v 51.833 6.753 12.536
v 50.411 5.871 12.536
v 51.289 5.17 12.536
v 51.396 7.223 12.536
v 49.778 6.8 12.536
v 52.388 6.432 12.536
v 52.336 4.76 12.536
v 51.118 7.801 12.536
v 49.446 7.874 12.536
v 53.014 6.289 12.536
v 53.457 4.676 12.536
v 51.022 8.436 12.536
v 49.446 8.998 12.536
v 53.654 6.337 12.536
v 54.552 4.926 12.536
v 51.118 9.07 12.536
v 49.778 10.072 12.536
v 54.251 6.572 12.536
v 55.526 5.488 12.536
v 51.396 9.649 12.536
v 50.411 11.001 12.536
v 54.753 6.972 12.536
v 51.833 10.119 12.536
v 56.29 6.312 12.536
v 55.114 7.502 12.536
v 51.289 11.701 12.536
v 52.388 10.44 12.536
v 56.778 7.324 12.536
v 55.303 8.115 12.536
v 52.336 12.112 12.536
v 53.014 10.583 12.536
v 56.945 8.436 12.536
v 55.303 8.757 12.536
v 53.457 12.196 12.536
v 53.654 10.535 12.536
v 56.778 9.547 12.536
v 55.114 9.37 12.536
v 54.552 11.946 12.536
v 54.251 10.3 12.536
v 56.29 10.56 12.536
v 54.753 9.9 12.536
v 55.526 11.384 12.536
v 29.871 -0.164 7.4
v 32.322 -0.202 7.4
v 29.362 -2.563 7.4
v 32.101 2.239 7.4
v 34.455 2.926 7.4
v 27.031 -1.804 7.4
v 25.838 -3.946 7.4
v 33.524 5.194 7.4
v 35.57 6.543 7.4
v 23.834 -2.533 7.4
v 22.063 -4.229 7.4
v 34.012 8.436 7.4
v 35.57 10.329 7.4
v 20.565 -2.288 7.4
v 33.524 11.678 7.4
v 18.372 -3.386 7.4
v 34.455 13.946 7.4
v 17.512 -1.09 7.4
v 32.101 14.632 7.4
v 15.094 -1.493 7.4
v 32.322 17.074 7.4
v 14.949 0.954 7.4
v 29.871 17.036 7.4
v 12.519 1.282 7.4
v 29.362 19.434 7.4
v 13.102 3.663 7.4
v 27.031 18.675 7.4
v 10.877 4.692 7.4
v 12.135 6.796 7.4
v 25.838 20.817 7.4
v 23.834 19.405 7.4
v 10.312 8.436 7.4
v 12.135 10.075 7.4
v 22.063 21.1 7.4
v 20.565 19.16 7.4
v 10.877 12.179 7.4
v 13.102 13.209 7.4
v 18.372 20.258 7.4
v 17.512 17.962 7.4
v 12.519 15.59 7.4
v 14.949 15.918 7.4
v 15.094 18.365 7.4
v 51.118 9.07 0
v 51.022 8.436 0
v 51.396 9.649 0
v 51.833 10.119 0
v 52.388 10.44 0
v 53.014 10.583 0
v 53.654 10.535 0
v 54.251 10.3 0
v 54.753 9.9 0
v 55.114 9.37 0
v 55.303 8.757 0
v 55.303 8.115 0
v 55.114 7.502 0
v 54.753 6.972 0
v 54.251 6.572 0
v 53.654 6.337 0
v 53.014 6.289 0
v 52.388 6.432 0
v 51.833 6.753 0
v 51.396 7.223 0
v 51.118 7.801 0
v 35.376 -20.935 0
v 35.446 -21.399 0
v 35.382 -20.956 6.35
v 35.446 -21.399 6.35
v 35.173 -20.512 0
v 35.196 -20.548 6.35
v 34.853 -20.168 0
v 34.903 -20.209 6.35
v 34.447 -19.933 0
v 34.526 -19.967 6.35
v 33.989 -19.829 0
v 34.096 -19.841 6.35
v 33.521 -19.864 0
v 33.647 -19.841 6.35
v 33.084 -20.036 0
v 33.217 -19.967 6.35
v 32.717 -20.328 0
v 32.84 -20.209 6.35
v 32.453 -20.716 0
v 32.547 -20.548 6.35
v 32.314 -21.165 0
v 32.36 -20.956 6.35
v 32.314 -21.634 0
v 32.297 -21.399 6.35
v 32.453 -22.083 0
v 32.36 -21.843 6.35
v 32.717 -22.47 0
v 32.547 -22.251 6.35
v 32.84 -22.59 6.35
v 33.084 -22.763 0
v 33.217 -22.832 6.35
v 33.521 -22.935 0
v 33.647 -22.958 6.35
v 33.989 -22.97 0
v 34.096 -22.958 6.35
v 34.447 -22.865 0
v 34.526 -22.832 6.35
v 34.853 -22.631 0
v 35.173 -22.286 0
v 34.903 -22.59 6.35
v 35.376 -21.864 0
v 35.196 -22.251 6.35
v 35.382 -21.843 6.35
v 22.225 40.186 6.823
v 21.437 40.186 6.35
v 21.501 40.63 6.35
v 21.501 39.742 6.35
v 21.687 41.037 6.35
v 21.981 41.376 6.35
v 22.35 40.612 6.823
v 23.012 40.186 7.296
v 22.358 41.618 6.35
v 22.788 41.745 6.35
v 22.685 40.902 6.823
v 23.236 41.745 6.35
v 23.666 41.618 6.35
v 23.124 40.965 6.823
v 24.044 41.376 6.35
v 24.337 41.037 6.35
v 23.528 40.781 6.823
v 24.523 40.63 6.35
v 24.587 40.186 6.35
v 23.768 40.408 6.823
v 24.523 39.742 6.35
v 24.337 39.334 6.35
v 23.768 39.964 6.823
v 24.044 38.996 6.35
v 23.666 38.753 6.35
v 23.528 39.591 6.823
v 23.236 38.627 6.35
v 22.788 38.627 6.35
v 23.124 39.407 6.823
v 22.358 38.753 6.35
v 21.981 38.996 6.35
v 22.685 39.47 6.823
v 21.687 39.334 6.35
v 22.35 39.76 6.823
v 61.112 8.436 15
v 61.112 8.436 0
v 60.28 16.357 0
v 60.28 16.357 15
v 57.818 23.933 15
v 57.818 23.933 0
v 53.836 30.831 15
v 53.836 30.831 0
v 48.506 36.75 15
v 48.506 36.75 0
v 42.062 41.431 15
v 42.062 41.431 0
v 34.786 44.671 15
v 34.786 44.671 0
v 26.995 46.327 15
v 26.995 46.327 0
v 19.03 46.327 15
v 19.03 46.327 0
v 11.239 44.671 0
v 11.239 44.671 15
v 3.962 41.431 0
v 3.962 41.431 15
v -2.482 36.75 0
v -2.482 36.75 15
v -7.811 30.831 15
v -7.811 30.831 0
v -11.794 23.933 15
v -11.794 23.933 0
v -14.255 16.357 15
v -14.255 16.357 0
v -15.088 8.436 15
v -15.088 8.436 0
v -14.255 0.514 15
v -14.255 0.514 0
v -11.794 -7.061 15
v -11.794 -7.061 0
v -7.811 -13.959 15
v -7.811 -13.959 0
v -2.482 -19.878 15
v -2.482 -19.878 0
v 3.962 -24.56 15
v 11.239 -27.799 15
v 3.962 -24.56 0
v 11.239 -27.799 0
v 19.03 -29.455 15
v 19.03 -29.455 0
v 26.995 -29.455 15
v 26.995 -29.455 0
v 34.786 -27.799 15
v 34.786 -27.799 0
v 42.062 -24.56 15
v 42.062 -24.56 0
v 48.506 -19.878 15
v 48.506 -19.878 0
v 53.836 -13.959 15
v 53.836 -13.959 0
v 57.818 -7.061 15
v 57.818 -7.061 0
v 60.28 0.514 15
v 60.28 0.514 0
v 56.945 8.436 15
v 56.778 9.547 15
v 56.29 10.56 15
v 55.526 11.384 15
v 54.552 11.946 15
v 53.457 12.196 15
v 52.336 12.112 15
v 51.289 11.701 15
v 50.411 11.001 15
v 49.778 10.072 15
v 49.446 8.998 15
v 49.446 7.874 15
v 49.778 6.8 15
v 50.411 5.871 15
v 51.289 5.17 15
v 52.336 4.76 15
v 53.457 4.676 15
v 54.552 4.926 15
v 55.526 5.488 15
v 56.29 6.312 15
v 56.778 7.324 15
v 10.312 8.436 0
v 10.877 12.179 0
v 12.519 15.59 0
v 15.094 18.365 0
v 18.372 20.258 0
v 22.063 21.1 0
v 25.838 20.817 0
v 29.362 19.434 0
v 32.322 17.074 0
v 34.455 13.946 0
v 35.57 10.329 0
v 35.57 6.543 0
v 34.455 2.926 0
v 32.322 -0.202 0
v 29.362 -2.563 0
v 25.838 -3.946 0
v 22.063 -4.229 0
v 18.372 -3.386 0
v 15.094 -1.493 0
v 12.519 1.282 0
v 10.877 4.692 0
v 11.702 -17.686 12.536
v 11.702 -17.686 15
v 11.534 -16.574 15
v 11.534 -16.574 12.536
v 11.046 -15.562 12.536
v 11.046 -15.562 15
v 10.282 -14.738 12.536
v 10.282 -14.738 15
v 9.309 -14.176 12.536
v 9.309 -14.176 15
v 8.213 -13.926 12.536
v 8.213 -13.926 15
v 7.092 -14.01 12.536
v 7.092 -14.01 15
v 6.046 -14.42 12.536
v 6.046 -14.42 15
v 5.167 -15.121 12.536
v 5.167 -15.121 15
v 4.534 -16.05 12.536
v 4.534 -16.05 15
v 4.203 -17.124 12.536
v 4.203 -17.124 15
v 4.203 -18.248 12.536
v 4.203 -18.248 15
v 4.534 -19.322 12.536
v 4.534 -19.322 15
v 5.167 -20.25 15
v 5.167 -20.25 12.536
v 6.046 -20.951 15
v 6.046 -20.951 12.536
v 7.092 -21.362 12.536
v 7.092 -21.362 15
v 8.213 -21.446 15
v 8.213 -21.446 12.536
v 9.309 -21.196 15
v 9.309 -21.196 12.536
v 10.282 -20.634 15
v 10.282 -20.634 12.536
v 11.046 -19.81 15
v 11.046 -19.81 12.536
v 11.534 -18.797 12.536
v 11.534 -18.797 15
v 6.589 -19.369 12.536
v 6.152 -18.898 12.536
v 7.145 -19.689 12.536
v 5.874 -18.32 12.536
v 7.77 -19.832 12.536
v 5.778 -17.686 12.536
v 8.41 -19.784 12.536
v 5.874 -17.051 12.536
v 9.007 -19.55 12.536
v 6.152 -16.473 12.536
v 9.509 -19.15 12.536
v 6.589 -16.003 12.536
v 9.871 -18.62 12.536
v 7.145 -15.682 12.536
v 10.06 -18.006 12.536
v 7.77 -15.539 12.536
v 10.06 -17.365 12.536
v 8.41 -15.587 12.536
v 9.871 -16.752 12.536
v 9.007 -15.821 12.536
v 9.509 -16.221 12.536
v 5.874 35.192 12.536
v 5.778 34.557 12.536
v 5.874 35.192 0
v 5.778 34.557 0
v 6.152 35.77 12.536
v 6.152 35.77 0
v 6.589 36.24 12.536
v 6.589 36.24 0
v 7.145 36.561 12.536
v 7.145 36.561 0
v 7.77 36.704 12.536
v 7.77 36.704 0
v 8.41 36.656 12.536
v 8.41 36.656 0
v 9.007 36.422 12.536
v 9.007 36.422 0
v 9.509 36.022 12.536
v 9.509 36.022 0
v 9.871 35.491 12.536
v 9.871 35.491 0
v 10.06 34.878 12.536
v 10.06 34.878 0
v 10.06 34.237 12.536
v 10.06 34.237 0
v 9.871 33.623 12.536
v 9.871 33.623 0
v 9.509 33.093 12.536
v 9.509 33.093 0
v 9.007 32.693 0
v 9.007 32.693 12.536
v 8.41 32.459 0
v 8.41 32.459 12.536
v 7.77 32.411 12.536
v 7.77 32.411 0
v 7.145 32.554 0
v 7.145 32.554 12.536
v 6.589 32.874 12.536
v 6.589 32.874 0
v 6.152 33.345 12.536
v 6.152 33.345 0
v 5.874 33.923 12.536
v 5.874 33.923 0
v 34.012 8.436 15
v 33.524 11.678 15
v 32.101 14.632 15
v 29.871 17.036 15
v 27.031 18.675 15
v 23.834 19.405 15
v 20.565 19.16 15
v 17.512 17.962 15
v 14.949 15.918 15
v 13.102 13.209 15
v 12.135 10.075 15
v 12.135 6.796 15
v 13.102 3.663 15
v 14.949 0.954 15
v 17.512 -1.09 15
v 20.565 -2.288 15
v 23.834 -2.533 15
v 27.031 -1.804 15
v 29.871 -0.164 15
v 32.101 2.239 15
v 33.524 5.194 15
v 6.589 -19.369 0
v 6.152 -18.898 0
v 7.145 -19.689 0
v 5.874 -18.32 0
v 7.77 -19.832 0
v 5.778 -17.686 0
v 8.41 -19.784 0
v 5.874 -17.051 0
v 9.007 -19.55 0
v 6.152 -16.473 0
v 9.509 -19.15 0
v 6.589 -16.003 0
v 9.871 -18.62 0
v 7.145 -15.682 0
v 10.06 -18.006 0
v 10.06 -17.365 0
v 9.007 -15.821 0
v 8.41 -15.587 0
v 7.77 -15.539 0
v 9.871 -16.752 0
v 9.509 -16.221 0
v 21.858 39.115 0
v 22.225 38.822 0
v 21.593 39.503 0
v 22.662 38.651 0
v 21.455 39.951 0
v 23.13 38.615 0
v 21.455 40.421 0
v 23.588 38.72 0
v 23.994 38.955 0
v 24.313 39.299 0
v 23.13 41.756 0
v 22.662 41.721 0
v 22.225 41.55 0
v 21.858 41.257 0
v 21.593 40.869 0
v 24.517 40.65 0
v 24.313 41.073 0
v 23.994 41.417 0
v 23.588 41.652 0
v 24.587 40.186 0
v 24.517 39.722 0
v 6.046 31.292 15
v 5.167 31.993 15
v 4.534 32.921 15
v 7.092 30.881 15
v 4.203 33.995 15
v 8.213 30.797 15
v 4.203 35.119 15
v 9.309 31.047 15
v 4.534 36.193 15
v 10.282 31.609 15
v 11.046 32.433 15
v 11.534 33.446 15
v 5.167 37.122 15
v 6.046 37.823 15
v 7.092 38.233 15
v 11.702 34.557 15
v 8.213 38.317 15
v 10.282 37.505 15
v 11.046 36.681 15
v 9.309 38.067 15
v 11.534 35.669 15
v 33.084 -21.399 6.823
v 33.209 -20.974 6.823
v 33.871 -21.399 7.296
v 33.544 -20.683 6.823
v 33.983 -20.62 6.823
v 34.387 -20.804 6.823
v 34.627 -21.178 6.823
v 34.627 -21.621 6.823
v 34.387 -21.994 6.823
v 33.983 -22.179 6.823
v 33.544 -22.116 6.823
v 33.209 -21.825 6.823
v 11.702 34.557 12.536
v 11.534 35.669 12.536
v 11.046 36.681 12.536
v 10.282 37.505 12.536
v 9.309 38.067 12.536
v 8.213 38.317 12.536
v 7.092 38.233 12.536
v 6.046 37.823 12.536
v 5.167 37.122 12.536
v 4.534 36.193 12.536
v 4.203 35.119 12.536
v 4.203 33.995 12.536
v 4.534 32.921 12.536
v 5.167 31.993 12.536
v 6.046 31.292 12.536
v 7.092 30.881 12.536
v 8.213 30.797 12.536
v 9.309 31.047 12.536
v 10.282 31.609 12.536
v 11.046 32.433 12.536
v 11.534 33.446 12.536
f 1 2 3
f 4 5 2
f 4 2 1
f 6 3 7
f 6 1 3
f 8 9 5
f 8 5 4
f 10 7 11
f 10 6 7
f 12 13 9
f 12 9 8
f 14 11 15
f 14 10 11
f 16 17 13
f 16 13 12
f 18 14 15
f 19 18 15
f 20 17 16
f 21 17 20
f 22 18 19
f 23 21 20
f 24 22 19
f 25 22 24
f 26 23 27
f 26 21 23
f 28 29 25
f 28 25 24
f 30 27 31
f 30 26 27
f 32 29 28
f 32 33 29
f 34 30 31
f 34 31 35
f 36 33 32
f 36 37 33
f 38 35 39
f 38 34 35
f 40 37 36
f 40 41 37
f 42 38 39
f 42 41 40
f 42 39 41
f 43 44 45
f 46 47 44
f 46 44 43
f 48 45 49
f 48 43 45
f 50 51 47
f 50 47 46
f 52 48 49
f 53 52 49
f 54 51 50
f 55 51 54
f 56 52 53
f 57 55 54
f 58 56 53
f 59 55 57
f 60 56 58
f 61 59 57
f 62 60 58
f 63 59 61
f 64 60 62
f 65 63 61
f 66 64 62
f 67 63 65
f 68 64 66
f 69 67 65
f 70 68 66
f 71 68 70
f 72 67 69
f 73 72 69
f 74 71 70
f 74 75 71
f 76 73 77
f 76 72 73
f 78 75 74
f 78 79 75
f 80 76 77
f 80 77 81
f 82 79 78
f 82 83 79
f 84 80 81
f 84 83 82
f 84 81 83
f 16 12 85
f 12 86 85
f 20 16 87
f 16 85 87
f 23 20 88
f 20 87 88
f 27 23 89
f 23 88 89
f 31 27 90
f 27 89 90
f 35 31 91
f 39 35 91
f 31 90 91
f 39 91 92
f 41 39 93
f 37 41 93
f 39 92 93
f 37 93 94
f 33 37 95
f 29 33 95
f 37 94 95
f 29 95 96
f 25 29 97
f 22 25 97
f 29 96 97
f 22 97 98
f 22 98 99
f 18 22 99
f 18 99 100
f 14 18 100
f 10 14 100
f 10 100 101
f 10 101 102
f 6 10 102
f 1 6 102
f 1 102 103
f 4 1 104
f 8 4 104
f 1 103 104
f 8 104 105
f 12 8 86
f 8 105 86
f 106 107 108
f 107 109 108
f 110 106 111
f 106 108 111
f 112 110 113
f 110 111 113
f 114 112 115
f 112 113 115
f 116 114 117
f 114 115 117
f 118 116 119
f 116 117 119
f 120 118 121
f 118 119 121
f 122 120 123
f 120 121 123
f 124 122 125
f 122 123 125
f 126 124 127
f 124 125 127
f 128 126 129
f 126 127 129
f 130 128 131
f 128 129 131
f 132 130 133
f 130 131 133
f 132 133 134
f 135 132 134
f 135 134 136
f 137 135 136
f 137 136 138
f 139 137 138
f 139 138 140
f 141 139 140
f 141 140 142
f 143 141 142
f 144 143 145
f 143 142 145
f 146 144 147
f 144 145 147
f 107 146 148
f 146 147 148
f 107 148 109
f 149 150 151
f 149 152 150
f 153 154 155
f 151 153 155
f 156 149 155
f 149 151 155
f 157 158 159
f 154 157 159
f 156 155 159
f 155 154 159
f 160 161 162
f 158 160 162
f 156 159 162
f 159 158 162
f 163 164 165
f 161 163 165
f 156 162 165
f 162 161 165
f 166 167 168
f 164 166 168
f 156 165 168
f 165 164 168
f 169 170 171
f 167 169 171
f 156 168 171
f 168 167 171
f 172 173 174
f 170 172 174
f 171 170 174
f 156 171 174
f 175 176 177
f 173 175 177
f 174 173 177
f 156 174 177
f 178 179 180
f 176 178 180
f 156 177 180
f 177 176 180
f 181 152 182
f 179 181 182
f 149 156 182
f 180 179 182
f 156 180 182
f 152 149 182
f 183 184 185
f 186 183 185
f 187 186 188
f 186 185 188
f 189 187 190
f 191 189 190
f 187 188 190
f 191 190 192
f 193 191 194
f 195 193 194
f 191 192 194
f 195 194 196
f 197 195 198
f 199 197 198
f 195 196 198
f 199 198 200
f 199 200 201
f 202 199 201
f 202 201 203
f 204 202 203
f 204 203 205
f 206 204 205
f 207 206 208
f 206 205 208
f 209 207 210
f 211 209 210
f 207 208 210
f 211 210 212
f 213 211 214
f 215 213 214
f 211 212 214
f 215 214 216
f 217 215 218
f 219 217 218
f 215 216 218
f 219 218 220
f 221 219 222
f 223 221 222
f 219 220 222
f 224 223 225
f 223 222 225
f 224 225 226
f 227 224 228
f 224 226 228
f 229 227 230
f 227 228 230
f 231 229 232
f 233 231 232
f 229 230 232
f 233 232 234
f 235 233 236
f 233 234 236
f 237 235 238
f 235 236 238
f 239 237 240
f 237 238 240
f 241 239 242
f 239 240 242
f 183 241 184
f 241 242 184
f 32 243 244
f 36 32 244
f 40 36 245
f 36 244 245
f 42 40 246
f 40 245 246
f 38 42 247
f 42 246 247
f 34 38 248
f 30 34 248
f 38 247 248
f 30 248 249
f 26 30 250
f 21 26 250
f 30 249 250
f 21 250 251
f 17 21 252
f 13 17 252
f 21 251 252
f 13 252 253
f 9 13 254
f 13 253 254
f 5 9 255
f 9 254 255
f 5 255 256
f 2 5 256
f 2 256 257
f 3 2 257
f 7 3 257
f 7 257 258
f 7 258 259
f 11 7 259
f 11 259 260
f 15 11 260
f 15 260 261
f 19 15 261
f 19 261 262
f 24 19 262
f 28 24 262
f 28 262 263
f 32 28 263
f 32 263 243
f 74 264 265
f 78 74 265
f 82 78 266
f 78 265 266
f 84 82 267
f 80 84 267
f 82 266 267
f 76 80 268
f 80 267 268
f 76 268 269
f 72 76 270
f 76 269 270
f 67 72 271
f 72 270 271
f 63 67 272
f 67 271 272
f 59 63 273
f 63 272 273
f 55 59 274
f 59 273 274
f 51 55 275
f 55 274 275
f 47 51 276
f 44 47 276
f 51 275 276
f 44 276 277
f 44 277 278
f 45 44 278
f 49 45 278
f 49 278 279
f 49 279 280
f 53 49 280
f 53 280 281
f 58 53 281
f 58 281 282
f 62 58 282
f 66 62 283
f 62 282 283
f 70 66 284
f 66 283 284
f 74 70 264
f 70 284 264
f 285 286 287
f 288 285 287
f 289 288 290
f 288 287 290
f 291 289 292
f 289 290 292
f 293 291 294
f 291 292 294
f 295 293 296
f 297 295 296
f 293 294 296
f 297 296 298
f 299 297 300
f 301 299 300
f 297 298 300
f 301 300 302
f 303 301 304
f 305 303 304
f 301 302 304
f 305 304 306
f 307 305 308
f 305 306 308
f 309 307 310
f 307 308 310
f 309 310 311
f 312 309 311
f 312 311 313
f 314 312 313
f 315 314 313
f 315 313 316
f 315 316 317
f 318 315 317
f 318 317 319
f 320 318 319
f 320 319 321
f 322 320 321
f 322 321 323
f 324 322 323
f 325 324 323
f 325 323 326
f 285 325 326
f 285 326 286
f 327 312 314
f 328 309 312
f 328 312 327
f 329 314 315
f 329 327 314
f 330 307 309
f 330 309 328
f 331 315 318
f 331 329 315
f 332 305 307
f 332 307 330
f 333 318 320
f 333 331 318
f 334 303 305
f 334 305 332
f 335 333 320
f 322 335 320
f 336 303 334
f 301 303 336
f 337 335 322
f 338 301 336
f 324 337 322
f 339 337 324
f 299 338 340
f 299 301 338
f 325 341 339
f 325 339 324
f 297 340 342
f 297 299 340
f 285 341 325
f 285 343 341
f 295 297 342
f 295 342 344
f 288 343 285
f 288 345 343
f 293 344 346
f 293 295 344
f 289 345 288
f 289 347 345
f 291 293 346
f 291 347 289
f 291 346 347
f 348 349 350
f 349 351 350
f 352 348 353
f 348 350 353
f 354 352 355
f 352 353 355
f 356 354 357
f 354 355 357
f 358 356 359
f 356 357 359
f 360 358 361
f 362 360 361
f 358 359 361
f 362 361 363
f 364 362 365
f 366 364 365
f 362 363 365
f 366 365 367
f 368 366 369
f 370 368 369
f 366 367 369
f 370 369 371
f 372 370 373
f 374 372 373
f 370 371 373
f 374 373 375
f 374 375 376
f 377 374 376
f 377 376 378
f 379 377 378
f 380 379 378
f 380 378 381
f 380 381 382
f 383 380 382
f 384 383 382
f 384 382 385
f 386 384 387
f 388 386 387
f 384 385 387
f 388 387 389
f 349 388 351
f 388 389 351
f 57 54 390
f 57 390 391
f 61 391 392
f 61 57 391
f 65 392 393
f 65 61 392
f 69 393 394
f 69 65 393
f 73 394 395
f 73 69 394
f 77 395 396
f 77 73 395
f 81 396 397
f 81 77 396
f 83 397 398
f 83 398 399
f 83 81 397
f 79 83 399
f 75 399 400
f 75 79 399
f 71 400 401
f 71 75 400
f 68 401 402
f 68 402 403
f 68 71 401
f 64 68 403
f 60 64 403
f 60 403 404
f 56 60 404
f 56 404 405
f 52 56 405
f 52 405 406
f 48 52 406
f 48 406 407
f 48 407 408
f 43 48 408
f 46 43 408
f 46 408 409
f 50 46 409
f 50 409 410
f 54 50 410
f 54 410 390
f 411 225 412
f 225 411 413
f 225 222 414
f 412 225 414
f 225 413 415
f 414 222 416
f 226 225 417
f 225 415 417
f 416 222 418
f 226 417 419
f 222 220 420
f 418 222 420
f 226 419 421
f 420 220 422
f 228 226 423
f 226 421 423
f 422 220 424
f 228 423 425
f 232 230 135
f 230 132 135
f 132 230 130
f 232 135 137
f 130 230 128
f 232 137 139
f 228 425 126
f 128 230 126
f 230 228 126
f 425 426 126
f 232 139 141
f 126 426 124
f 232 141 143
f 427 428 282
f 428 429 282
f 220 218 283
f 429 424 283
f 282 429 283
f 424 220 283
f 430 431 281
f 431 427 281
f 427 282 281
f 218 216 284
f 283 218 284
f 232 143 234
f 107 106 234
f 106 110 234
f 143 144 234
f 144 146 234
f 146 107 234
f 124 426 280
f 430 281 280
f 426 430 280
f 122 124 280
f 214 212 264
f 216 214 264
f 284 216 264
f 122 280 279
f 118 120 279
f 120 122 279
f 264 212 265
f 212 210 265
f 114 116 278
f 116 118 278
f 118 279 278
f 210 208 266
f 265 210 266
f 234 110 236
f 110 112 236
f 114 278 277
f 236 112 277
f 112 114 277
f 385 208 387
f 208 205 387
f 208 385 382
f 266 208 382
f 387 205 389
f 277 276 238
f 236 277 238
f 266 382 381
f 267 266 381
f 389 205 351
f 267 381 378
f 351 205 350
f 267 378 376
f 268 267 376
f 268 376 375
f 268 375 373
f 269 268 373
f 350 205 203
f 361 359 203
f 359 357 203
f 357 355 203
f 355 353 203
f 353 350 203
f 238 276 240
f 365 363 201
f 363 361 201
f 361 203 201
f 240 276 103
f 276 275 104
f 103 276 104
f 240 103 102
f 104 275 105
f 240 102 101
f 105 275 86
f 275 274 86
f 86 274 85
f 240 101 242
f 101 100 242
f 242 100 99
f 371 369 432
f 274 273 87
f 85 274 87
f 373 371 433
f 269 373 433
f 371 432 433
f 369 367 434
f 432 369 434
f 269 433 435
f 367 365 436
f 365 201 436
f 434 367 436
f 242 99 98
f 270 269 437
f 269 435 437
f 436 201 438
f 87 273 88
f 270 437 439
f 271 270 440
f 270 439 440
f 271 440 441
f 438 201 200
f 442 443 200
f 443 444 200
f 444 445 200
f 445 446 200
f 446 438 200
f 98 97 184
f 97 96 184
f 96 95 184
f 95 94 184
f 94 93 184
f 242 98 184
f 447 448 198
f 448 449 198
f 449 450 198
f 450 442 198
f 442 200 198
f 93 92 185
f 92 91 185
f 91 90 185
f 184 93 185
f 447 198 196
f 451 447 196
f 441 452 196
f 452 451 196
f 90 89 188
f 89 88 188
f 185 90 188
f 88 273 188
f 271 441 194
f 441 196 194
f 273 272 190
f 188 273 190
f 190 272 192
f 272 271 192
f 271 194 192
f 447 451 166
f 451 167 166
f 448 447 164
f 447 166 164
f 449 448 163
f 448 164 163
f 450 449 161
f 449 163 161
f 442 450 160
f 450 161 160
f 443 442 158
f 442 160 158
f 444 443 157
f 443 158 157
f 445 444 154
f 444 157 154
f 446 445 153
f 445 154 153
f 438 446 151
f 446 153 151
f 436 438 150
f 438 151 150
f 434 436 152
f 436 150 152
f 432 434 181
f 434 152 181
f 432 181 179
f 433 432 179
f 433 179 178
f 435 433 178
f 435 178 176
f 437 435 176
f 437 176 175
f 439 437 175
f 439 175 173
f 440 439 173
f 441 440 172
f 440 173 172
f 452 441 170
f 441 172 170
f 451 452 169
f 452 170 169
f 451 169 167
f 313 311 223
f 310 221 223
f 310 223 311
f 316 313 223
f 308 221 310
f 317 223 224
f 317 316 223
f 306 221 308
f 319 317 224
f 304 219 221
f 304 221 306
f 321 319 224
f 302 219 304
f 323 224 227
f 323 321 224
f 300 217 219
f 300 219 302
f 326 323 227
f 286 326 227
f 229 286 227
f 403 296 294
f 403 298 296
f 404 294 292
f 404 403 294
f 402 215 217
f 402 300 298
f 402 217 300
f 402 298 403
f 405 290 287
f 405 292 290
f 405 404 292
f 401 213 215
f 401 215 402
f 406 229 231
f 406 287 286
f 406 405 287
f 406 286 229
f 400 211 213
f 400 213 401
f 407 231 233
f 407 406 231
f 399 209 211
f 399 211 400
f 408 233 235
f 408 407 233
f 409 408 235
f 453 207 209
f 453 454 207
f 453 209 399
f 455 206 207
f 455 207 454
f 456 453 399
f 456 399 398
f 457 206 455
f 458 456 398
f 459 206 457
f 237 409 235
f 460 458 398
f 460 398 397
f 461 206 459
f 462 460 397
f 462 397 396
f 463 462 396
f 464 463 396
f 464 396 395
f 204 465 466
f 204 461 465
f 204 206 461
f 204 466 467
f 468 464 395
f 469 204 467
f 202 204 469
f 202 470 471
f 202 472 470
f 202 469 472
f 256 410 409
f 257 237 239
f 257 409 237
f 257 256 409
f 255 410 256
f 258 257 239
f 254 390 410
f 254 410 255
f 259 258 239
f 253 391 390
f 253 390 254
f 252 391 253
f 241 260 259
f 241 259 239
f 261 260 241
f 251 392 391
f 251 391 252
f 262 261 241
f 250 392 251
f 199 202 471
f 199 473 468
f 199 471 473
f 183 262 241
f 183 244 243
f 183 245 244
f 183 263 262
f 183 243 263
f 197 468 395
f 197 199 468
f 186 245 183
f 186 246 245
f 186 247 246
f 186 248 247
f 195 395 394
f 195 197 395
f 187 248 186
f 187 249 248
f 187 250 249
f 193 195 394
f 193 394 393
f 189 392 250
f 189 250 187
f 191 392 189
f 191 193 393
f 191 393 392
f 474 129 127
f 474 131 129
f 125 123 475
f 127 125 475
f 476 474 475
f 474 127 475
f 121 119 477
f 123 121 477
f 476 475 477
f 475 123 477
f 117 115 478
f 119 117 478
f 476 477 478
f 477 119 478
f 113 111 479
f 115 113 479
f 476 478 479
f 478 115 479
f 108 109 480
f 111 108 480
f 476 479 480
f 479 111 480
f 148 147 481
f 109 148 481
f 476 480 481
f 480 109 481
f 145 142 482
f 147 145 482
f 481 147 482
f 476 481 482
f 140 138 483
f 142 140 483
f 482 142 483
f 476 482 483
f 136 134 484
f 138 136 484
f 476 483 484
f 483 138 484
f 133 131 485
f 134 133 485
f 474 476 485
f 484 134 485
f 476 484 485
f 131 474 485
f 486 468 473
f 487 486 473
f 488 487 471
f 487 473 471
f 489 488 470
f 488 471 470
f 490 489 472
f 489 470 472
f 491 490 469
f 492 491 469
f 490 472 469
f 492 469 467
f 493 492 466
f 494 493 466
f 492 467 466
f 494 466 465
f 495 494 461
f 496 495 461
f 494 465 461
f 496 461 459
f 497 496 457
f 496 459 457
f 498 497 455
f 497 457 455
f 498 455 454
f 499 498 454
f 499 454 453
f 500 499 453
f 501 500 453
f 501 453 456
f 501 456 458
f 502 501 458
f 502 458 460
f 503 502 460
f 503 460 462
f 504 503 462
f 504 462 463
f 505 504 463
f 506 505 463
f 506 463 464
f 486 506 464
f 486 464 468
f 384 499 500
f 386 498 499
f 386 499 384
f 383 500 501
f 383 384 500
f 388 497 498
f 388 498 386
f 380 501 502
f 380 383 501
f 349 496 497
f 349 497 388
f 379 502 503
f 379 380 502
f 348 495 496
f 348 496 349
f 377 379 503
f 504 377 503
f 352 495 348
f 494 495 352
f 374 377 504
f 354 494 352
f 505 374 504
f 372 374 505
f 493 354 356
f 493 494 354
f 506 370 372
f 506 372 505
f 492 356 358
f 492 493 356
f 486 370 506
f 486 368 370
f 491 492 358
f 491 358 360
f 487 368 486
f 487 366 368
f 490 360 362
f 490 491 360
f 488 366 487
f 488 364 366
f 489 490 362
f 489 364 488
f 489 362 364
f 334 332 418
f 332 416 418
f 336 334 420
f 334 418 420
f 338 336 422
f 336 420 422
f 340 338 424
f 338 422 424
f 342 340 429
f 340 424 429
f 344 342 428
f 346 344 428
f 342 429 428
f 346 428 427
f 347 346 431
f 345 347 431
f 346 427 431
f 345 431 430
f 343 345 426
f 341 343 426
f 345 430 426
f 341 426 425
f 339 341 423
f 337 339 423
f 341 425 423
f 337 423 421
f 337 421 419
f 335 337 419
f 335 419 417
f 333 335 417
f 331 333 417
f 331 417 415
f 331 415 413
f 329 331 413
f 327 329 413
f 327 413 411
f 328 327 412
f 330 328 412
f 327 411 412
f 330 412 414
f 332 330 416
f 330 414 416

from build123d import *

# Parameters (mm, degrees)
ESQUISSE1_R                                      = 38.1
ESQUISSE1_R_2                                    = 11
BOSS_EXTRU_1_DEPTH                               = 15
ESQUISSE2_R                                      = 12.7
ENL_V_MAT_EXTRU_1_DEPTH                          = 7.4
CHAMBRAGE_POUR_VIS_T_TE_RONDE_BOMB_E_D           = 4.3053
CHAMBRAGE_POUR_VIS_T_TE_RONDE_BOMB_E_DEPTH       = 15
CHAMBRAGE_POUR_VIS_T_TE_RONDE_BOMB_E_CBORE_D     = 7.54126
CHAMBRAGE_POUR_VIS_T_TE_RONDE_BOMB_E_CBORE_DEPTH = 2.4638
CHAMBRAGE_POUR_VIS_T_TE_RONDE_BOMB_E_TIP         = 1.293442612
F_1_8_0_124_TROUS_DE_CENTRAGE1_D                 = 3.1496
F_1_8_0_124_TROUS_DE_CENTRAGE1_DEPTH             = 6.35
F_1_8_0_124_TROUS_DE_CENTRAGE1_TIP               = 0.946235303


with BuildPart() as part:
    # Esquisse1 → Boss.-Extru.1 (new body)
    with BuildSketch(Plane.XY):
        with Locations((23.012291104, 8.435887891)):
            Circle(ESQUISSE1_R)
        with Locations((23.012291104, 8.435887891)):
            Circle(ESQUISSE1_R_2, mode=Mode.SUBTRACT)
    extrude(amount=BOSS_EXTRU_1_DEPTH)

    # Esquisse2 → Enlèv. mat.-Extru.1 (cut)
    with BuildSketch(Plane(origin=(0, 0, 0), x_dir=(-1, 0, 0), z_dir=(0, 0, -1))):
        with Locations((-23.012291104, 8.435887891)):
            Circle(ESQUISSE2_R)
    extrude(amount=-ENL_V_MAT_EXTRU_1_DEPTH, mode=Mode.SUBTRACT)

    # Chambrage pour vis à tête ronde bombée #61
    with Locations(Plane.XY.offset(15)):
        with Locations((7.931041104, 34.557379133), (53.174791104, 8.435887891), (7.931041104, -17.68560335)):
            CounterBoreHole(CHAMBRAGE_POUR_VIS_T_TE_RONDE_BOMB_E_D / 2, CHAMBRAGE_POUR_VIS_T_TE_RONDE_BOMB_E_CBORE_D / 2, CHAMBRAGE_POUR_VIS_T_TE_RONDE_BOMB_E_CBORE_DEPTH, depth=CHAMBRAGE_POUR_VIS_T_TE_RONDE_BOMB_E_DEPTH)
            with Locations((0, 0, -(CHAMBRAGE_POUR_VIS_T_TE_RONDE_BOMB_E_DEPTH + CHAMBRAGE_POUR_VIS_T_TE_RONDE_BOMB_E_TIP / 2))):  # 118° drill point
                Cone(0, CHAMBRAGE_POUR_VIS_T_TE_RONDE_BOMB_E_D / 2, CHAMBRAGE_POUR_VIS_T_TE_RONDE_BOMB_E_TIP, mode=Mode.SUBTRACT)

    # 1/8 (0.124) Trous de centrage1
    with Locations(Plane(origin=(0, 0, 0), x_dir=(-1, 0, 0), z_dir=(0, 0, -1))):
        with Locations((-23.012291104, 40.185887891), (-33.871430655, -21.399352819)):
            Hole(F_1_8_0_124_TROUS_DE_CENTRAGE1_D / 2, depth=F_1_8_0_124_TROUS_DE_CENTRAGE1_DEPTH)
            with Locations((0, 0, -(F_1_8_0_124_TROUS_DE_CENTRAGE1_DEPTH + F_1_8_0_124_TROUS_DE_CENTRAGE1_TIP / 2))):  # 118° drill point
                Cone(0, F_1_8_0_124_TROUS_DE_CENTRAGE1_D / 2, F_1_8_0_124_TROUS_DE_CENTRAGE1_TIP, mode=Mode.SUBTRACT)


solid = part.part
